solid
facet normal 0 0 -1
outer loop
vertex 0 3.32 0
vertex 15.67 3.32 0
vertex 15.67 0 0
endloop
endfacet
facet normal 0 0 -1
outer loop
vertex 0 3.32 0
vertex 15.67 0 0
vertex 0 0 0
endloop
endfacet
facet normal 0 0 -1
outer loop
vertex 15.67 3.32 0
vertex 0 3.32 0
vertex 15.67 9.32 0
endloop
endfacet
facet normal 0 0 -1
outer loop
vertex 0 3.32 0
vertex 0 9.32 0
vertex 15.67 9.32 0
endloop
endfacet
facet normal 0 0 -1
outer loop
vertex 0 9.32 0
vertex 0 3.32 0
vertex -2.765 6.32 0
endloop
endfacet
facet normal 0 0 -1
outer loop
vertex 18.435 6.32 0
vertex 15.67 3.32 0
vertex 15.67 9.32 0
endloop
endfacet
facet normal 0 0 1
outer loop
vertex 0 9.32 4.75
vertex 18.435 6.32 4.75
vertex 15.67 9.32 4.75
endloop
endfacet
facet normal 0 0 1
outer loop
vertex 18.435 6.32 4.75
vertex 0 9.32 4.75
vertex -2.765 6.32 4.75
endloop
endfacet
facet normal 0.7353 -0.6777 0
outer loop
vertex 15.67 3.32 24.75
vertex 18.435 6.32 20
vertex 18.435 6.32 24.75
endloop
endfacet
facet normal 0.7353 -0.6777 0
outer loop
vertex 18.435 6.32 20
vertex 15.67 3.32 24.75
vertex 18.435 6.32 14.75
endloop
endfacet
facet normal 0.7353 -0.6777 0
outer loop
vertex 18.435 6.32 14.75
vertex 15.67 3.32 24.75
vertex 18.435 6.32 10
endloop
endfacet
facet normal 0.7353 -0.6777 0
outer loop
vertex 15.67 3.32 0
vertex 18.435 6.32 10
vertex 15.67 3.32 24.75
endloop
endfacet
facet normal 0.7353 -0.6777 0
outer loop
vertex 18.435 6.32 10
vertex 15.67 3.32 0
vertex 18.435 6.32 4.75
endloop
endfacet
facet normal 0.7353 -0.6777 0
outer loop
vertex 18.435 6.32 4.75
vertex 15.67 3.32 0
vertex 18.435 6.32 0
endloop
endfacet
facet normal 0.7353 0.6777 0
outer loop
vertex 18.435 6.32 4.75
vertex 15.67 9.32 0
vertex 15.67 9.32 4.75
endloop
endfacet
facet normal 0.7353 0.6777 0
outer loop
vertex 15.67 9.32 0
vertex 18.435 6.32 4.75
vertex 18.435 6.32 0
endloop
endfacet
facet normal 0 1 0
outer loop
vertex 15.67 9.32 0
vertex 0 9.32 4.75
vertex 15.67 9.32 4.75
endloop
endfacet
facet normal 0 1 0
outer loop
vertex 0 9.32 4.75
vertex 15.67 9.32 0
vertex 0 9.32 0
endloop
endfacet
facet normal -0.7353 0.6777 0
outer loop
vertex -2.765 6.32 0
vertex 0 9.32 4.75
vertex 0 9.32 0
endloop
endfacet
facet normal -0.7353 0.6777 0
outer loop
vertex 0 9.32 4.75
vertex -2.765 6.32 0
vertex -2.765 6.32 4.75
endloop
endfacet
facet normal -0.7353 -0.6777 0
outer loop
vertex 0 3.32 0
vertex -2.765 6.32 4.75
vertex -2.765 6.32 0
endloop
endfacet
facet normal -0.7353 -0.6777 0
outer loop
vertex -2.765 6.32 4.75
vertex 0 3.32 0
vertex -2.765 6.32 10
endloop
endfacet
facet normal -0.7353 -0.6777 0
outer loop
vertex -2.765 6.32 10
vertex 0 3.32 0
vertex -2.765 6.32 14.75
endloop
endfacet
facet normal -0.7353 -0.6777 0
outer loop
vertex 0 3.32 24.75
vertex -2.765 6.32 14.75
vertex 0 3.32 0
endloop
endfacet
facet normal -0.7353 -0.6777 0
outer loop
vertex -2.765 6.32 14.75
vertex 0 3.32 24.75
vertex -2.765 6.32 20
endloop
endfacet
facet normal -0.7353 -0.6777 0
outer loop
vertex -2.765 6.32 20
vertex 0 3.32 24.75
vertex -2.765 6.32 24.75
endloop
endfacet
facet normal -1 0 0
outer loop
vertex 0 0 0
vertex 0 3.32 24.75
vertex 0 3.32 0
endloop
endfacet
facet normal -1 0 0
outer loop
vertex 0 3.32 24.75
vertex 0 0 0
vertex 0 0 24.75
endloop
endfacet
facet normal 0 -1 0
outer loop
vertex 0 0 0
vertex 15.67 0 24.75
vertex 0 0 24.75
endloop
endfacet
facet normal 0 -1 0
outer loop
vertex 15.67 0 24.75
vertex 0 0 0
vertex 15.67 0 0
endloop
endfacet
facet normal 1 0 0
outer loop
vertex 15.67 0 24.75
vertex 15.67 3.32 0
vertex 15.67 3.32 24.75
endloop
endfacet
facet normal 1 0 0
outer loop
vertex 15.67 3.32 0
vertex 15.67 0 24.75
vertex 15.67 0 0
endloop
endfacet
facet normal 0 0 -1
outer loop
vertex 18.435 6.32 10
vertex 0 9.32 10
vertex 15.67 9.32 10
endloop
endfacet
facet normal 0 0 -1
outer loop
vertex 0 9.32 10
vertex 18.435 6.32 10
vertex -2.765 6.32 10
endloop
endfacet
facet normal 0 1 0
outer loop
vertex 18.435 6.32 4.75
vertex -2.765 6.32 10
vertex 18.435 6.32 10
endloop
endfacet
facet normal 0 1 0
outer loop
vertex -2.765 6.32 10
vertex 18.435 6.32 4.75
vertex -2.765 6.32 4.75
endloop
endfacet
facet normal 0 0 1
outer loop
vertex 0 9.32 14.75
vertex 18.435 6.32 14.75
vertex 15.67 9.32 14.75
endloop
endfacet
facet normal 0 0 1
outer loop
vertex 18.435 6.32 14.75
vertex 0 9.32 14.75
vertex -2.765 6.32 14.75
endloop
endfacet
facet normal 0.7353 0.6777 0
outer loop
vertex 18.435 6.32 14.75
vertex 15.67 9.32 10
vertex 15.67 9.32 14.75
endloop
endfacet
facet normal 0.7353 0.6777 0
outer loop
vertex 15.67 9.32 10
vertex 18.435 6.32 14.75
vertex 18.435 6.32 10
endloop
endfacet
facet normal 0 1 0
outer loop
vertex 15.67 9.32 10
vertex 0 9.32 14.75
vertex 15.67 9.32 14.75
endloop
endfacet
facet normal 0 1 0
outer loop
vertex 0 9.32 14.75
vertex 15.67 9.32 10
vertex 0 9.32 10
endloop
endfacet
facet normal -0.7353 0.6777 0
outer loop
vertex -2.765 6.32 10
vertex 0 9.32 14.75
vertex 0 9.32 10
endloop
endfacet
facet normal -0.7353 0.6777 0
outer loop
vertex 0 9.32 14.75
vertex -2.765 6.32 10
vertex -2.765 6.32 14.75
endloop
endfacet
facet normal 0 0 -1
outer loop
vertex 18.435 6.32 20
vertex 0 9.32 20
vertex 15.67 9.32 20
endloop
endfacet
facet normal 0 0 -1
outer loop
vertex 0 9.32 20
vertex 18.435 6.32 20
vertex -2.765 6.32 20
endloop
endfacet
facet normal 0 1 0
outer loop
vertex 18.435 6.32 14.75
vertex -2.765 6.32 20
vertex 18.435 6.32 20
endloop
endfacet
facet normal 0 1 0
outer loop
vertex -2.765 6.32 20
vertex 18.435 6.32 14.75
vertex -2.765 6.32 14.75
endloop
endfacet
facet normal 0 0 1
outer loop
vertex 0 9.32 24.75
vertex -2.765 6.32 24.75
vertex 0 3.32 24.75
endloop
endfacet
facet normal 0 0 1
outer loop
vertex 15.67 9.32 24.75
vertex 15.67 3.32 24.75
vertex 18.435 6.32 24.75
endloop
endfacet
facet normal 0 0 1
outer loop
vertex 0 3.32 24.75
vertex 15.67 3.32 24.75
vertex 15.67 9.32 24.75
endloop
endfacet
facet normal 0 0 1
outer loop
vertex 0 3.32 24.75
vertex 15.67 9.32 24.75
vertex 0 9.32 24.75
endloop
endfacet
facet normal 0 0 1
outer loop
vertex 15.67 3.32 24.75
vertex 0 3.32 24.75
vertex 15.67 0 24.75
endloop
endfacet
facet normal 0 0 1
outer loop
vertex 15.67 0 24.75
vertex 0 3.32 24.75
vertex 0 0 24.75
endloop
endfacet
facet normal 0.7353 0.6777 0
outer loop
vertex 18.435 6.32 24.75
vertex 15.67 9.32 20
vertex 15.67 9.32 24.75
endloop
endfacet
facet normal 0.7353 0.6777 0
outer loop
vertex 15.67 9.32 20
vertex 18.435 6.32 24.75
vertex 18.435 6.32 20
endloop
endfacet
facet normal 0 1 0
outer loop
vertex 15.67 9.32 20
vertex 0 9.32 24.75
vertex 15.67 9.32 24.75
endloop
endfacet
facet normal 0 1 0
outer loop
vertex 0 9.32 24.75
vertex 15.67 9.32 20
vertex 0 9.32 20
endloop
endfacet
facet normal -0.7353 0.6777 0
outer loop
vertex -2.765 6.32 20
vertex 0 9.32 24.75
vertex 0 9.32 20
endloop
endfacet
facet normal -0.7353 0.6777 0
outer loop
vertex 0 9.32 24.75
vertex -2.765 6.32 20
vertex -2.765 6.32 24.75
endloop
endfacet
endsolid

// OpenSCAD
railBottomHeight = 3.32;
railBottomWidth = 15.67;

numberOfRails = 3;

lengthOfRail = 4.75;
lengthOfGap = 5.25;
heightOfGap = 3;

railTopHeight = 6;
railTopWidth = 21.2;


railDifferencePerSide = (railTopWidth - railBottomWidth) / 2;



union() {    
    for (i = [0: numberOfRails - 1]){ 
        translate([0, 0, i * (lengthOfRail + lengthOfGap)]) { 
            linear_extrude(lengthOfRail) {
                polygon([
                    [0, 0], 
                    [0, railBottomHeight],
                    [-railDifferencePerSide, railBottomHeight + railTopHeight / 2],
                    [0, railBottomHeight + railTopHeight],
                    [railBottomWidth, railBottomHeight + railTopHeight],
                    [railBottomWidth + railDifferencePerSide, railBottomHeight + railTopHeight / 2],
                    [railBottomWidth, railBottomHeight],
                    [railBottomWidth, 0],
                    [0, 0]
                    ]
                    );
            }
        }
        if (i < numberOfRails - 1) {
            translate([0, 0, i * (lengthOfRail + lengthOfGap) + lengthOfRail]) {    
                linear_extrude(lengthOfGap) {
                    polygon([
                        [0, 0], 
                        [0, railBottomHeight],
                        [-railDifferencePerSide, railBottomHeight + railTopHeight / 2],
                        [railBottomWidth + railDifferencePerSide, railBottomHeight + railTopHeight / 2],
                        [railBottomWidth, railBottomHeight],
                        [railBottomWidth, 0],
                        [0, 0]
                        ]
                        );
                }
            }
        }
    }
}
